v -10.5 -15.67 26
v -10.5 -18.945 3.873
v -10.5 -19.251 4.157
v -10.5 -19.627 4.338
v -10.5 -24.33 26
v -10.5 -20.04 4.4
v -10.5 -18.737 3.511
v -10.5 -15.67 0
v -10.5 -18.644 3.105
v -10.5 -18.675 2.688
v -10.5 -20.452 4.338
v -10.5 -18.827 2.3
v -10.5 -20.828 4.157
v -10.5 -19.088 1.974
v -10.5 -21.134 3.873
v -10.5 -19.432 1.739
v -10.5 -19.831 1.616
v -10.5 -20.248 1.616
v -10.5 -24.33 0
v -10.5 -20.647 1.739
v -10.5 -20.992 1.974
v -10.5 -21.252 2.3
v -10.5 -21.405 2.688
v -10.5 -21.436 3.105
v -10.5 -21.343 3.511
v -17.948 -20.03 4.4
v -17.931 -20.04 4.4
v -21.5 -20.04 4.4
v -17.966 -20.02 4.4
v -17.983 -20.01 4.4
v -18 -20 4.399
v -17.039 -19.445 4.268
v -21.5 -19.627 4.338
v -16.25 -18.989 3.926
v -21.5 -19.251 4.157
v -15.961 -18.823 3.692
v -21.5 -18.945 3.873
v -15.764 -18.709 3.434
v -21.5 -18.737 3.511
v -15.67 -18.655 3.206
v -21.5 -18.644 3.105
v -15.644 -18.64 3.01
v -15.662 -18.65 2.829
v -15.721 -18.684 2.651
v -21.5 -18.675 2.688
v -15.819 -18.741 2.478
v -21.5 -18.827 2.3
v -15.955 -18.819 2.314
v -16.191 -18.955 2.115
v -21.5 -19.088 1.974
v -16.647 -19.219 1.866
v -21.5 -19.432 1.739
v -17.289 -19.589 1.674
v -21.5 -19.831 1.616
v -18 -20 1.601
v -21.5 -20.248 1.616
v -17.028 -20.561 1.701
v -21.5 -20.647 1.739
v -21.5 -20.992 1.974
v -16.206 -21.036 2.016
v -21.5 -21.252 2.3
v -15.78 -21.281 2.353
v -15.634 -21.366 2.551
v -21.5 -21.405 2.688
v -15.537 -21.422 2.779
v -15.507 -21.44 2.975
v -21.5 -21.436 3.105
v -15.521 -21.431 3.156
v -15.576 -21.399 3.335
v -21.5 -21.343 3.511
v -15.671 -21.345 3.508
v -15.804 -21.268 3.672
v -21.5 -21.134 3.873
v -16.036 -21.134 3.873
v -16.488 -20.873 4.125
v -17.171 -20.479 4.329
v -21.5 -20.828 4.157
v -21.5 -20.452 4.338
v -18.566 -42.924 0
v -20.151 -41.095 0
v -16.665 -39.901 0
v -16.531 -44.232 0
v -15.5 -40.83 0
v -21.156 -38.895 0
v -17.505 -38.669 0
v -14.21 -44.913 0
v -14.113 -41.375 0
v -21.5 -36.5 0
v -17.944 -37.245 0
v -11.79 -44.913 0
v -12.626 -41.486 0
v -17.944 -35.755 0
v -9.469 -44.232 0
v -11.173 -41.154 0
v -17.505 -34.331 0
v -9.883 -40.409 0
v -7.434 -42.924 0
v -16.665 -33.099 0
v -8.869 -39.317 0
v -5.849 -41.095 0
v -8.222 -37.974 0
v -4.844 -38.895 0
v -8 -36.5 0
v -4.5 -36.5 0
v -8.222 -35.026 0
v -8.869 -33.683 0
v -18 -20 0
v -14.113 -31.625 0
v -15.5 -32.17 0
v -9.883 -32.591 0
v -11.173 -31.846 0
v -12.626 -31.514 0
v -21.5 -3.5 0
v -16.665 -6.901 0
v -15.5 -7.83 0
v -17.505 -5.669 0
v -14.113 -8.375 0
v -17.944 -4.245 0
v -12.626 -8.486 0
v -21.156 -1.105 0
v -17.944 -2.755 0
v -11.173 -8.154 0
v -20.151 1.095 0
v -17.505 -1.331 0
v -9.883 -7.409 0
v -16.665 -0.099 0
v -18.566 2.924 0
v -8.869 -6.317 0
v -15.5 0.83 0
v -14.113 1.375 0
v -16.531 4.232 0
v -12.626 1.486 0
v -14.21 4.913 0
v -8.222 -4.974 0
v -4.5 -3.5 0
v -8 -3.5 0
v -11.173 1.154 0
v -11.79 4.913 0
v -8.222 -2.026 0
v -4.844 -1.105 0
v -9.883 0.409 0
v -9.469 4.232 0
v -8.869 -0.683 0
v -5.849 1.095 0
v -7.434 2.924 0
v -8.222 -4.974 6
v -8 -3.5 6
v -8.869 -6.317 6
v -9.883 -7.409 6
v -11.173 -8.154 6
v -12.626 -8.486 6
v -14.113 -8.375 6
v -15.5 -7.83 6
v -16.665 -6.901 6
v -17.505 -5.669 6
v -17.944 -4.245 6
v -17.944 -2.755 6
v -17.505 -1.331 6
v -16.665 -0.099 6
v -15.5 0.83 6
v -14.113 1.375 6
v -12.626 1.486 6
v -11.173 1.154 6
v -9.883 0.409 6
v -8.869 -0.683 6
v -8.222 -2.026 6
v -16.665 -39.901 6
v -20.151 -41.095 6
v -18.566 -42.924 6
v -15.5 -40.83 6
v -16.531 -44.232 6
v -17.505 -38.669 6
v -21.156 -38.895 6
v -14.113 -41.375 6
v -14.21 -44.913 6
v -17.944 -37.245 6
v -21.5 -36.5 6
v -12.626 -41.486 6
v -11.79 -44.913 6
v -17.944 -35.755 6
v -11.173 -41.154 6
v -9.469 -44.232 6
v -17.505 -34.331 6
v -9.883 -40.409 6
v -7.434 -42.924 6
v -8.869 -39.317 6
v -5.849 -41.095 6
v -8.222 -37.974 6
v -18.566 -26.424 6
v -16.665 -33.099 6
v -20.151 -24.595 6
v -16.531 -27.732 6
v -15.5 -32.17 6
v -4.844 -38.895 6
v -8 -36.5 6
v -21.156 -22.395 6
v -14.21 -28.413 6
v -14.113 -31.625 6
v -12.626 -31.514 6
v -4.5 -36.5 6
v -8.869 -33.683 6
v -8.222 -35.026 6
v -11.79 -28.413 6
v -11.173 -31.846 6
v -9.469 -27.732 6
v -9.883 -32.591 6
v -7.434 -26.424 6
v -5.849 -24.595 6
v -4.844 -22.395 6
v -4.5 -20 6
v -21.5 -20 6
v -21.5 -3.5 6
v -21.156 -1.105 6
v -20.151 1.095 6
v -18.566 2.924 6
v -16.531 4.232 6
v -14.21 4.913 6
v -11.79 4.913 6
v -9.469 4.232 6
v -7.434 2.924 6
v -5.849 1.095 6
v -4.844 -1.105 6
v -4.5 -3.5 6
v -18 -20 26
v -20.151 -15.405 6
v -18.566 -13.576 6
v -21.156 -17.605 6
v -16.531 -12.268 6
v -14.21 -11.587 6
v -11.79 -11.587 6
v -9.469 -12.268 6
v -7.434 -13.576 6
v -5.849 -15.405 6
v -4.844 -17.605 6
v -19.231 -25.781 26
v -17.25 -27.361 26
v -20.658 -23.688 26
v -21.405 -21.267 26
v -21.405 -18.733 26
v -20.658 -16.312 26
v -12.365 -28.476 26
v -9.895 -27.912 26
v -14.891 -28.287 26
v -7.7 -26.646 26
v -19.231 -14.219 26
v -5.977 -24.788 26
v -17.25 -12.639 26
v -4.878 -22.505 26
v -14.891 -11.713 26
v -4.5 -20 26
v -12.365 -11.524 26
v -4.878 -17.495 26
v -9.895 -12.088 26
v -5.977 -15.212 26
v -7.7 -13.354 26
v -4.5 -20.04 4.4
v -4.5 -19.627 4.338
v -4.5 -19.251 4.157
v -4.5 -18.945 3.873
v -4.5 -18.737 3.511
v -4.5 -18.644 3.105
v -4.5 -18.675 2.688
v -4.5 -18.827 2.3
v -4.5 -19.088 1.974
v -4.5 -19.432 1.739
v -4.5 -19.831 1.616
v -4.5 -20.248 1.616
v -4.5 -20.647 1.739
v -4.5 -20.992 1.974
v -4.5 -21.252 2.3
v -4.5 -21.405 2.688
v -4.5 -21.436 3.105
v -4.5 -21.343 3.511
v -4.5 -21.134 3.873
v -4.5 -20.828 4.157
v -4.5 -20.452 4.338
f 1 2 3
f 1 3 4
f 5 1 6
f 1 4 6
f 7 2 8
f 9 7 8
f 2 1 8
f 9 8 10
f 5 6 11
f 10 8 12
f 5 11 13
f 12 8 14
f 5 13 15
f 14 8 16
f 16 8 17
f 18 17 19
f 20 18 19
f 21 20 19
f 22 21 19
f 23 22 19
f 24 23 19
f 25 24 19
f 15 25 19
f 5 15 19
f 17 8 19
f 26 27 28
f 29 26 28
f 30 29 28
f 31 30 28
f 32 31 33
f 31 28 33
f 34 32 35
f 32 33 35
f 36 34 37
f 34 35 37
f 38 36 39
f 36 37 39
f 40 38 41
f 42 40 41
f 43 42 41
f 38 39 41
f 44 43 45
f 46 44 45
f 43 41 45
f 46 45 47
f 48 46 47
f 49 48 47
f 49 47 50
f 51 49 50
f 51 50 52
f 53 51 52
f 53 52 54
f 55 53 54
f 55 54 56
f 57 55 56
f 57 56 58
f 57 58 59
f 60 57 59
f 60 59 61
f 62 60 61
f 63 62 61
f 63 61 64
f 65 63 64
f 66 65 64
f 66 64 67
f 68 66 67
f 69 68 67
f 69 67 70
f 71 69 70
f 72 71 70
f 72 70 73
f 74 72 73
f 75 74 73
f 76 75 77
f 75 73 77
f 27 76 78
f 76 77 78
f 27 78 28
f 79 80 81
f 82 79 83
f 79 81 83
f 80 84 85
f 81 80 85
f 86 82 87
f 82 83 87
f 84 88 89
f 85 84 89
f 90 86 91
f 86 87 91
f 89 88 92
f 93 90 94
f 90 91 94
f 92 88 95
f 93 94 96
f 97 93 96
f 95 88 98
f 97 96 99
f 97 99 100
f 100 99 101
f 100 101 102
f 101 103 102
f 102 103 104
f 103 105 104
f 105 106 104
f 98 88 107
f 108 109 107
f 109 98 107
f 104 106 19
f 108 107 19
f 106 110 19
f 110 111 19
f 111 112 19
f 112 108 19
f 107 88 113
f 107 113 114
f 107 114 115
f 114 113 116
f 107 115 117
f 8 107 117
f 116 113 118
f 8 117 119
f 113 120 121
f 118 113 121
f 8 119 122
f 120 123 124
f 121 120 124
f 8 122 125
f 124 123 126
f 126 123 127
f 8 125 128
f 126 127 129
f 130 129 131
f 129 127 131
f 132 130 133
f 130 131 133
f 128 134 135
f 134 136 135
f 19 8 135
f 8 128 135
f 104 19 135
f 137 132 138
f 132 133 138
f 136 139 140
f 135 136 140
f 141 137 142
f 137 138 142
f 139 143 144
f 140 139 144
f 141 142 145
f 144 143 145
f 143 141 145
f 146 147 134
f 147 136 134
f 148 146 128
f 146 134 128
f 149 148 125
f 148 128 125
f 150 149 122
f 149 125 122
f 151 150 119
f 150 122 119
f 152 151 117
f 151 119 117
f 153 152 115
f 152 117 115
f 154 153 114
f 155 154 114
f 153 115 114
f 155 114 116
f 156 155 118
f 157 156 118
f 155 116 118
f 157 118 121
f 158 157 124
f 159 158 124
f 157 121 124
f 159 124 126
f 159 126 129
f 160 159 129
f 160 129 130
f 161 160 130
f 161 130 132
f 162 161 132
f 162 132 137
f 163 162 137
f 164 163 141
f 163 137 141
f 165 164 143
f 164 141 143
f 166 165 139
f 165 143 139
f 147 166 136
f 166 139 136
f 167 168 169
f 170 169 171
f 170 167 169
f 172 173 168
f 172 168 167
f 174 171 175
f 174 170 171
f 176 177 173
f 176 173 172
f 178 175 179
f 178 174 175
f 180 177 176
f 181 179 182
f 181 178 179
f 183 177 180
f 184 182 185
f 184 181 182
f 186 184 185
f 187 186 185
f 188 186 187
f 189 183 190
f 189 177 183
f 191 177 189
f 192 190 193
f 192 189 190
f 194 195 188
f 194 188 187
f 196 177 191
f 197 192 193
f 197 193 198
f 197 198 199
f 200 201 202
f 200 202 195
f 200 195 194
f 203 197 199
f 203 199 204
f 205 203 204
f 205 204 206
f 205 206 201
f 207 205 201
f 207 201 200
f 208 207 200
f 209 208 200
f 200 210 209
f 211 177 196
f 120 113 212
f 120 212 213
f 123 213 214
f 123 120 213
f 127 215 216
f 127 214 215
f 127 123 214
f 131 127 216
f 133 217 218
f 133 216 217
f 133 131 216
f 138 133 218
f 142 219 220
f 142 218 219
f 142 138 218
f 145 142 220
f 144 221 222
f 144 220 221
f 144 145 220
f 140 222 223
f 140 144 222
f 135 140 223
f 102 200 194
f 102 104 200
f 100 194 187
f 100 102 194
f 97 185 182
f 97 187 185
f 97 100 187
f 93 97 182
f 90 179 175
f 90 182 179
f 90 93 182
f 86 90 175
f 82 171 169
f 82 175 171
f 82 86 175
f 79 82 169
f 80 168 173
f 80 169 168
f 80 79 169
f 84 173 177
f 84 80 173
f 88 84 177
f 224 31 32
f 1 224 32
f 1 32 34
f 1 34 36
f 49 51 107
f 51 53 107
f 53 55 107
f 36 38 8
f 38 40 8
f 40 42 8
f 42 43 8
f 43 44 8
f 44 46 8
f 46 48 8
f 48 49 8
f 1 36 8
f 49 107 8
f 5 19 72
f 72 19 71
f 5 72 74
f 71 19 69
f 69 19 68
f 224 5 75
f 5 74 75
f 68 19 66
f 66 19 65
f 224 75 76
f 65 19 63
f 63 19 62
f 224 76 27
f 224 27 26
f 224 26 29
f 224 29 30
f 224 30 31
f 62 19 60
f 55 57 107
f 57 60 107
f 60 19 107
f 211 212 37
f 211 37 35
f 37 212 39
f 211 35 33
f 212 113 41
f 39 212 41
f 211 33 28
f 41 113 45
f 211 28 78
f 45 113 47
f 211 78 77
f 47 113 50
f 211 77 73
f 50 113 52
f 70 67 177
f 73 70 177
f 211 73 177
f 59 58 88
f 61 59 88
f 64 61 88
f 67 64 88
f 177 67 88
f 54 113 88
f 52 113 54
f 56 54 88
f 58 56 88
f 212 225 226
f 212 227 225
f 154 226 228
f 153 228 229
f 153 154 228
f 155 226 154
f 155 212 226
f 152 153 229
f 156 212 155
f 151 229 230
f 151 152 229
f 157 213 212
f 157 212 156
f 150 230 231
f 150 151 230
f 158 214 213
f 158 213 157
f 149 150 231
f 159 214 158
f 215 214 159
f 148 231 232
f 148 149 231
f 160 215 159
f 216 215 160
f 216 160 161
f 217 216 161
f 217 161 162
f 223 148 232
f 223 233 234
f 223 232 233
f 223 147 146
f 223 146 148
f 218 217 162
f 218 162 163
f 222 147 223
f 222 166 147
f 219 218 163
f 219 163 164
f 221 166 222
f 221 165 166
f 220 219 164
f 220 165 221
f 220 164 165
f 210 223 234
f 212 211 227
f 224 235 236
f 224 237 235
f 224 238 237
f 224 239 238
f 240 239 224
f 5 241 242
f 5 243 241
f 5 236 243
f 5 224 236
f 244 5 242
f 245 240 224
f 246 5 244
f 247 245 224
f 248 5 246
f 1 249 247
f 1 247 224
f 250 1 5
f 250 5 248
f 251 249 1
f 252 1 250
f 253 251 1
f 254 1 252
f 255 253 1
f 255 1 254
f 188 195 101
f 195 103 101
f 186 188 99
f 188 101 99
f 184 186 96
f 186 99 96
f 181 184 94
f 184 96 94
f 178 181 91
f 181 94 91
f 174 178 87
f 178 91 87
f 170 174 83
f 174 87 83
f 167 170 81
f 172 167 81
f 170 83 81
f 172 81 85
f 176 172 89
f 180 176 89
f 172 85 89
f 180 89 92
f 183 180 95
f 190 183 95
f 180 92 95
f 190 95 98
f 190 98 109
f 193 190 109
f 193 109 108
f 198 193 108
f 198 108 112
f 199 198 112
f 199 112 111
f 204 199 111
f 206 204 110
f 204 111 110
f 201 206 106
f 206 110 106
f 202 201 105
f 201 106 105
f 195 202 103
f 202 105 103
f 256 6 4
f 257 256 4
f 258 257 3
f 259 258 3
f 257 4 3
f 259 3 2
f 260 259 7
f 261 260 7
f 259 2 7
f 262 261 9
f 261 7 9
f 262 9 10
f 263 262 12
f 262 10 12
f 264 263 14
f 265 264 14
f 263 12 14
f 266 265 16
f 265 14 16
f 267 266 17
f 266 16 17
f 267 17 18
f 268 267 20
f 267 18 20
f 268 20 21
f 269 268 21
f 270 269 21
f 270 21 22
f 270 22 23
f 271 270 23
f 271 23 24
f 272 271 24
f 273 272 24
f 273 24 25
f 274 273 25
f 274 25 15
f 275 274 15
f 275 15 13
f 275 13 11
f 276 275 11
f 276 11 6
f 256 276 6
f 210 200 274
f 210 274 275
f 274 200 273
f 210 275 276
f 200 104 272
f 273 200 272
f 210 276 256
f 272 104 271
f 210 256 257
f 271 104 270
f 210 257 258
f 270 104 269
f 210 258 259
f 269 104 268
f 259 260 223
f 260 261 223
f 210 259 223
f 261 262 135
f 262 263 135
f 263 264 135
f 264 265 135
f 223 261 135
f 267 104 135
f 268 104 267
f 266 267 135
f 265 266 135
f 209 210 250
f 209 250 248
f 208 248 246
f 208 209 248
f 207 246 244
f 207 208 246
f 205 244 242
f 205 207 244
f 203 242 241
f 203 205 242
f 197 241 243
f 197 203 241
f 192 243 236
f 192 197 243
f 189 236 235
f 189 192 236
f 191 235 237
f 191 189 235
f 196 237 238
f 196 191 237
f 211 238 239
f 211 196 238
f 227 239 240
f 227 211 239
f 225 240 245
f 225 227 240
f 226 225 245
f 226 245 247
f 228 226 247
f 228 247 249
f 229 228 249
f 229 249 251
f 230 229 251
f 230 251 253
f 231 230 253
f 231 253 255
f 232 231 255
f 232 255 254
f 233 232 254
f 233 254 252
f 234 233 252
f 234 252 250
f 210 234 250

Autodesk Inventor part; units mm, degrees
ref_plane "YZ Plane" through (0, 0, 0) normal (1, 0, 0) x (0, 1, 0)
ref_plane "XZ Plane" through (0, 0, 0) normal (0, 1, 0) x (-1, 0, 0)
ref_plane "XY Plane" through (0, 0, 0) normal (0, 0, 1) x (1, 0, 0)
ref_plane "Arbeitsebene1" through (0, 0, 0) normal (0, 0, 1) x (1, 0, 0)
sketch "Skizze1" plane through (0, 0, 0) normal (0, 0, 1) x (1, 0, 0)
  circle A0 centre (-13, -20) radius 11 projected
  circle A1 centre (-13, -36.5) radius 2 projected
  circle A2 centre (-13, -3.5) radius 2 projected
  line L0 (0, 0) -> (0, -9.8388) projected
  line L1 (-29, 0) -> (0, 0) projected
  line L2 (-33, -4) -> (-29, 0) projected
  line L3 (-33, -4) -> (-33, -36) projected
  line L4 (-29, -40) -> (-33, -36) projected
  line L5 (0, -40) -> (-29, -40) projected
  line L6 (0, -30.1612) -> (0, -40) projected
  arc A3 (0, -30.1612) -> (0, -9.8388) centre (-13, -20) ccw projected
  circle A4 centre (-13, -3.5) radius 5
  circle A5 centre (-13, -36.5) radius 5
  circle A6 centre (-13, -20) radius 2.5
  line L7 (-13, -3.5) -> (-13, -36.5) construction
  line L8 (-21.5, -3.5) -> (-21.5, -36.5)
  line L9 (-4.5, -36.5) -> (-4.5, -3.5)
  arc A7 (-4.5, -3.5) -> (-21.5, -3.5) centre (-13, -3.5) ccw
  arc A8 (-21.5, -36.5) -> (-4.5, -36.5) centre (-13, -36.5) ccw
  line L10 (-18, -20) -> (-10.5, -15.6699)
  line L11 (-10.5, -15.6699) -> (-10.5, -24.3301)
  line L12 (-10.5, -24.3301) -> (-18, -20)
  point P0 (-13, -20)
  point P1 (-13, -20)
  dimension "d0" = 10
  dimension "d1" = 10
  dimension "d2" = 5
  dimension "d3" = 17
extrude "Extrusion1" add sketch "Skizze1" along normal blind 6 contours L9 A0 L8 | A0 L8 A7 L1 A4 L9 | L9 A8 L5 A5 L8 A0 | L1 A4 A7 | A8 L5 A5
sketch "Skizze2" plane through (-21.5, -36.5, 0) normal (-1, 0, 0) x (0, 0, 1)
  line L0 (6, 19) -> (0, 19) projected
  line L1 (6, 14) -> (0, 14) projected
  circle A0 centre (3, 16.4602) radius 1.4
  point P0 (0, 36.5)
  dimension "d6" = 2.8
extrude "Extrusion2" cut sketch "Skizze2" against normal through all
sketch "Skizze3" plane through (0, 0, 6) normal (0, 0, 1) x (1, 0, 0)
  point P0 (0, 0)
sketch "Skizze4" plane through (0, 0, 6) normal (0, 0, 1) x (1, 0, 0)
  line L0 (-21.5, -3.5) -> (-21.5, -36.5) projected
  arc A0 (-21.5, -36.5) -> (-4.5, -36.5) centre (-13, -36.5) ccw projected
  line L1 (-4.5, -36.5) -> (-4.5, -3.5) projected
  arc A1 (-4.5, -3.5) -> (-21.5, -3.5) centre (-13, -3.5) ccw projected
  circle A2 centre (-13, -36.5) radius 5 projected
  circle A3 centre (-13, -3.5) radius 5 projected
  line L2 (-18, -20) -> (-10.5, -15.6699)
  line L3 (-10.5, -15.6699) -> (-10.5, -24.3301)
  line L4 (-10.5, -24.3301) -> (-18, -20)
  circle A4 centre (-13, -20) radius 2.5
  circle A5 centre (-13, -20) radius 8.5
  point P0 (0, 0)
  dimension "d9" = 5
extrude "Extrusion3" add sketch "Skizze4" along normal blind 20 contours A5
properties part number "40_XYZstage_micrometer_motorized_nema8_samplemount_lightsheet_feptube50_screwed"
